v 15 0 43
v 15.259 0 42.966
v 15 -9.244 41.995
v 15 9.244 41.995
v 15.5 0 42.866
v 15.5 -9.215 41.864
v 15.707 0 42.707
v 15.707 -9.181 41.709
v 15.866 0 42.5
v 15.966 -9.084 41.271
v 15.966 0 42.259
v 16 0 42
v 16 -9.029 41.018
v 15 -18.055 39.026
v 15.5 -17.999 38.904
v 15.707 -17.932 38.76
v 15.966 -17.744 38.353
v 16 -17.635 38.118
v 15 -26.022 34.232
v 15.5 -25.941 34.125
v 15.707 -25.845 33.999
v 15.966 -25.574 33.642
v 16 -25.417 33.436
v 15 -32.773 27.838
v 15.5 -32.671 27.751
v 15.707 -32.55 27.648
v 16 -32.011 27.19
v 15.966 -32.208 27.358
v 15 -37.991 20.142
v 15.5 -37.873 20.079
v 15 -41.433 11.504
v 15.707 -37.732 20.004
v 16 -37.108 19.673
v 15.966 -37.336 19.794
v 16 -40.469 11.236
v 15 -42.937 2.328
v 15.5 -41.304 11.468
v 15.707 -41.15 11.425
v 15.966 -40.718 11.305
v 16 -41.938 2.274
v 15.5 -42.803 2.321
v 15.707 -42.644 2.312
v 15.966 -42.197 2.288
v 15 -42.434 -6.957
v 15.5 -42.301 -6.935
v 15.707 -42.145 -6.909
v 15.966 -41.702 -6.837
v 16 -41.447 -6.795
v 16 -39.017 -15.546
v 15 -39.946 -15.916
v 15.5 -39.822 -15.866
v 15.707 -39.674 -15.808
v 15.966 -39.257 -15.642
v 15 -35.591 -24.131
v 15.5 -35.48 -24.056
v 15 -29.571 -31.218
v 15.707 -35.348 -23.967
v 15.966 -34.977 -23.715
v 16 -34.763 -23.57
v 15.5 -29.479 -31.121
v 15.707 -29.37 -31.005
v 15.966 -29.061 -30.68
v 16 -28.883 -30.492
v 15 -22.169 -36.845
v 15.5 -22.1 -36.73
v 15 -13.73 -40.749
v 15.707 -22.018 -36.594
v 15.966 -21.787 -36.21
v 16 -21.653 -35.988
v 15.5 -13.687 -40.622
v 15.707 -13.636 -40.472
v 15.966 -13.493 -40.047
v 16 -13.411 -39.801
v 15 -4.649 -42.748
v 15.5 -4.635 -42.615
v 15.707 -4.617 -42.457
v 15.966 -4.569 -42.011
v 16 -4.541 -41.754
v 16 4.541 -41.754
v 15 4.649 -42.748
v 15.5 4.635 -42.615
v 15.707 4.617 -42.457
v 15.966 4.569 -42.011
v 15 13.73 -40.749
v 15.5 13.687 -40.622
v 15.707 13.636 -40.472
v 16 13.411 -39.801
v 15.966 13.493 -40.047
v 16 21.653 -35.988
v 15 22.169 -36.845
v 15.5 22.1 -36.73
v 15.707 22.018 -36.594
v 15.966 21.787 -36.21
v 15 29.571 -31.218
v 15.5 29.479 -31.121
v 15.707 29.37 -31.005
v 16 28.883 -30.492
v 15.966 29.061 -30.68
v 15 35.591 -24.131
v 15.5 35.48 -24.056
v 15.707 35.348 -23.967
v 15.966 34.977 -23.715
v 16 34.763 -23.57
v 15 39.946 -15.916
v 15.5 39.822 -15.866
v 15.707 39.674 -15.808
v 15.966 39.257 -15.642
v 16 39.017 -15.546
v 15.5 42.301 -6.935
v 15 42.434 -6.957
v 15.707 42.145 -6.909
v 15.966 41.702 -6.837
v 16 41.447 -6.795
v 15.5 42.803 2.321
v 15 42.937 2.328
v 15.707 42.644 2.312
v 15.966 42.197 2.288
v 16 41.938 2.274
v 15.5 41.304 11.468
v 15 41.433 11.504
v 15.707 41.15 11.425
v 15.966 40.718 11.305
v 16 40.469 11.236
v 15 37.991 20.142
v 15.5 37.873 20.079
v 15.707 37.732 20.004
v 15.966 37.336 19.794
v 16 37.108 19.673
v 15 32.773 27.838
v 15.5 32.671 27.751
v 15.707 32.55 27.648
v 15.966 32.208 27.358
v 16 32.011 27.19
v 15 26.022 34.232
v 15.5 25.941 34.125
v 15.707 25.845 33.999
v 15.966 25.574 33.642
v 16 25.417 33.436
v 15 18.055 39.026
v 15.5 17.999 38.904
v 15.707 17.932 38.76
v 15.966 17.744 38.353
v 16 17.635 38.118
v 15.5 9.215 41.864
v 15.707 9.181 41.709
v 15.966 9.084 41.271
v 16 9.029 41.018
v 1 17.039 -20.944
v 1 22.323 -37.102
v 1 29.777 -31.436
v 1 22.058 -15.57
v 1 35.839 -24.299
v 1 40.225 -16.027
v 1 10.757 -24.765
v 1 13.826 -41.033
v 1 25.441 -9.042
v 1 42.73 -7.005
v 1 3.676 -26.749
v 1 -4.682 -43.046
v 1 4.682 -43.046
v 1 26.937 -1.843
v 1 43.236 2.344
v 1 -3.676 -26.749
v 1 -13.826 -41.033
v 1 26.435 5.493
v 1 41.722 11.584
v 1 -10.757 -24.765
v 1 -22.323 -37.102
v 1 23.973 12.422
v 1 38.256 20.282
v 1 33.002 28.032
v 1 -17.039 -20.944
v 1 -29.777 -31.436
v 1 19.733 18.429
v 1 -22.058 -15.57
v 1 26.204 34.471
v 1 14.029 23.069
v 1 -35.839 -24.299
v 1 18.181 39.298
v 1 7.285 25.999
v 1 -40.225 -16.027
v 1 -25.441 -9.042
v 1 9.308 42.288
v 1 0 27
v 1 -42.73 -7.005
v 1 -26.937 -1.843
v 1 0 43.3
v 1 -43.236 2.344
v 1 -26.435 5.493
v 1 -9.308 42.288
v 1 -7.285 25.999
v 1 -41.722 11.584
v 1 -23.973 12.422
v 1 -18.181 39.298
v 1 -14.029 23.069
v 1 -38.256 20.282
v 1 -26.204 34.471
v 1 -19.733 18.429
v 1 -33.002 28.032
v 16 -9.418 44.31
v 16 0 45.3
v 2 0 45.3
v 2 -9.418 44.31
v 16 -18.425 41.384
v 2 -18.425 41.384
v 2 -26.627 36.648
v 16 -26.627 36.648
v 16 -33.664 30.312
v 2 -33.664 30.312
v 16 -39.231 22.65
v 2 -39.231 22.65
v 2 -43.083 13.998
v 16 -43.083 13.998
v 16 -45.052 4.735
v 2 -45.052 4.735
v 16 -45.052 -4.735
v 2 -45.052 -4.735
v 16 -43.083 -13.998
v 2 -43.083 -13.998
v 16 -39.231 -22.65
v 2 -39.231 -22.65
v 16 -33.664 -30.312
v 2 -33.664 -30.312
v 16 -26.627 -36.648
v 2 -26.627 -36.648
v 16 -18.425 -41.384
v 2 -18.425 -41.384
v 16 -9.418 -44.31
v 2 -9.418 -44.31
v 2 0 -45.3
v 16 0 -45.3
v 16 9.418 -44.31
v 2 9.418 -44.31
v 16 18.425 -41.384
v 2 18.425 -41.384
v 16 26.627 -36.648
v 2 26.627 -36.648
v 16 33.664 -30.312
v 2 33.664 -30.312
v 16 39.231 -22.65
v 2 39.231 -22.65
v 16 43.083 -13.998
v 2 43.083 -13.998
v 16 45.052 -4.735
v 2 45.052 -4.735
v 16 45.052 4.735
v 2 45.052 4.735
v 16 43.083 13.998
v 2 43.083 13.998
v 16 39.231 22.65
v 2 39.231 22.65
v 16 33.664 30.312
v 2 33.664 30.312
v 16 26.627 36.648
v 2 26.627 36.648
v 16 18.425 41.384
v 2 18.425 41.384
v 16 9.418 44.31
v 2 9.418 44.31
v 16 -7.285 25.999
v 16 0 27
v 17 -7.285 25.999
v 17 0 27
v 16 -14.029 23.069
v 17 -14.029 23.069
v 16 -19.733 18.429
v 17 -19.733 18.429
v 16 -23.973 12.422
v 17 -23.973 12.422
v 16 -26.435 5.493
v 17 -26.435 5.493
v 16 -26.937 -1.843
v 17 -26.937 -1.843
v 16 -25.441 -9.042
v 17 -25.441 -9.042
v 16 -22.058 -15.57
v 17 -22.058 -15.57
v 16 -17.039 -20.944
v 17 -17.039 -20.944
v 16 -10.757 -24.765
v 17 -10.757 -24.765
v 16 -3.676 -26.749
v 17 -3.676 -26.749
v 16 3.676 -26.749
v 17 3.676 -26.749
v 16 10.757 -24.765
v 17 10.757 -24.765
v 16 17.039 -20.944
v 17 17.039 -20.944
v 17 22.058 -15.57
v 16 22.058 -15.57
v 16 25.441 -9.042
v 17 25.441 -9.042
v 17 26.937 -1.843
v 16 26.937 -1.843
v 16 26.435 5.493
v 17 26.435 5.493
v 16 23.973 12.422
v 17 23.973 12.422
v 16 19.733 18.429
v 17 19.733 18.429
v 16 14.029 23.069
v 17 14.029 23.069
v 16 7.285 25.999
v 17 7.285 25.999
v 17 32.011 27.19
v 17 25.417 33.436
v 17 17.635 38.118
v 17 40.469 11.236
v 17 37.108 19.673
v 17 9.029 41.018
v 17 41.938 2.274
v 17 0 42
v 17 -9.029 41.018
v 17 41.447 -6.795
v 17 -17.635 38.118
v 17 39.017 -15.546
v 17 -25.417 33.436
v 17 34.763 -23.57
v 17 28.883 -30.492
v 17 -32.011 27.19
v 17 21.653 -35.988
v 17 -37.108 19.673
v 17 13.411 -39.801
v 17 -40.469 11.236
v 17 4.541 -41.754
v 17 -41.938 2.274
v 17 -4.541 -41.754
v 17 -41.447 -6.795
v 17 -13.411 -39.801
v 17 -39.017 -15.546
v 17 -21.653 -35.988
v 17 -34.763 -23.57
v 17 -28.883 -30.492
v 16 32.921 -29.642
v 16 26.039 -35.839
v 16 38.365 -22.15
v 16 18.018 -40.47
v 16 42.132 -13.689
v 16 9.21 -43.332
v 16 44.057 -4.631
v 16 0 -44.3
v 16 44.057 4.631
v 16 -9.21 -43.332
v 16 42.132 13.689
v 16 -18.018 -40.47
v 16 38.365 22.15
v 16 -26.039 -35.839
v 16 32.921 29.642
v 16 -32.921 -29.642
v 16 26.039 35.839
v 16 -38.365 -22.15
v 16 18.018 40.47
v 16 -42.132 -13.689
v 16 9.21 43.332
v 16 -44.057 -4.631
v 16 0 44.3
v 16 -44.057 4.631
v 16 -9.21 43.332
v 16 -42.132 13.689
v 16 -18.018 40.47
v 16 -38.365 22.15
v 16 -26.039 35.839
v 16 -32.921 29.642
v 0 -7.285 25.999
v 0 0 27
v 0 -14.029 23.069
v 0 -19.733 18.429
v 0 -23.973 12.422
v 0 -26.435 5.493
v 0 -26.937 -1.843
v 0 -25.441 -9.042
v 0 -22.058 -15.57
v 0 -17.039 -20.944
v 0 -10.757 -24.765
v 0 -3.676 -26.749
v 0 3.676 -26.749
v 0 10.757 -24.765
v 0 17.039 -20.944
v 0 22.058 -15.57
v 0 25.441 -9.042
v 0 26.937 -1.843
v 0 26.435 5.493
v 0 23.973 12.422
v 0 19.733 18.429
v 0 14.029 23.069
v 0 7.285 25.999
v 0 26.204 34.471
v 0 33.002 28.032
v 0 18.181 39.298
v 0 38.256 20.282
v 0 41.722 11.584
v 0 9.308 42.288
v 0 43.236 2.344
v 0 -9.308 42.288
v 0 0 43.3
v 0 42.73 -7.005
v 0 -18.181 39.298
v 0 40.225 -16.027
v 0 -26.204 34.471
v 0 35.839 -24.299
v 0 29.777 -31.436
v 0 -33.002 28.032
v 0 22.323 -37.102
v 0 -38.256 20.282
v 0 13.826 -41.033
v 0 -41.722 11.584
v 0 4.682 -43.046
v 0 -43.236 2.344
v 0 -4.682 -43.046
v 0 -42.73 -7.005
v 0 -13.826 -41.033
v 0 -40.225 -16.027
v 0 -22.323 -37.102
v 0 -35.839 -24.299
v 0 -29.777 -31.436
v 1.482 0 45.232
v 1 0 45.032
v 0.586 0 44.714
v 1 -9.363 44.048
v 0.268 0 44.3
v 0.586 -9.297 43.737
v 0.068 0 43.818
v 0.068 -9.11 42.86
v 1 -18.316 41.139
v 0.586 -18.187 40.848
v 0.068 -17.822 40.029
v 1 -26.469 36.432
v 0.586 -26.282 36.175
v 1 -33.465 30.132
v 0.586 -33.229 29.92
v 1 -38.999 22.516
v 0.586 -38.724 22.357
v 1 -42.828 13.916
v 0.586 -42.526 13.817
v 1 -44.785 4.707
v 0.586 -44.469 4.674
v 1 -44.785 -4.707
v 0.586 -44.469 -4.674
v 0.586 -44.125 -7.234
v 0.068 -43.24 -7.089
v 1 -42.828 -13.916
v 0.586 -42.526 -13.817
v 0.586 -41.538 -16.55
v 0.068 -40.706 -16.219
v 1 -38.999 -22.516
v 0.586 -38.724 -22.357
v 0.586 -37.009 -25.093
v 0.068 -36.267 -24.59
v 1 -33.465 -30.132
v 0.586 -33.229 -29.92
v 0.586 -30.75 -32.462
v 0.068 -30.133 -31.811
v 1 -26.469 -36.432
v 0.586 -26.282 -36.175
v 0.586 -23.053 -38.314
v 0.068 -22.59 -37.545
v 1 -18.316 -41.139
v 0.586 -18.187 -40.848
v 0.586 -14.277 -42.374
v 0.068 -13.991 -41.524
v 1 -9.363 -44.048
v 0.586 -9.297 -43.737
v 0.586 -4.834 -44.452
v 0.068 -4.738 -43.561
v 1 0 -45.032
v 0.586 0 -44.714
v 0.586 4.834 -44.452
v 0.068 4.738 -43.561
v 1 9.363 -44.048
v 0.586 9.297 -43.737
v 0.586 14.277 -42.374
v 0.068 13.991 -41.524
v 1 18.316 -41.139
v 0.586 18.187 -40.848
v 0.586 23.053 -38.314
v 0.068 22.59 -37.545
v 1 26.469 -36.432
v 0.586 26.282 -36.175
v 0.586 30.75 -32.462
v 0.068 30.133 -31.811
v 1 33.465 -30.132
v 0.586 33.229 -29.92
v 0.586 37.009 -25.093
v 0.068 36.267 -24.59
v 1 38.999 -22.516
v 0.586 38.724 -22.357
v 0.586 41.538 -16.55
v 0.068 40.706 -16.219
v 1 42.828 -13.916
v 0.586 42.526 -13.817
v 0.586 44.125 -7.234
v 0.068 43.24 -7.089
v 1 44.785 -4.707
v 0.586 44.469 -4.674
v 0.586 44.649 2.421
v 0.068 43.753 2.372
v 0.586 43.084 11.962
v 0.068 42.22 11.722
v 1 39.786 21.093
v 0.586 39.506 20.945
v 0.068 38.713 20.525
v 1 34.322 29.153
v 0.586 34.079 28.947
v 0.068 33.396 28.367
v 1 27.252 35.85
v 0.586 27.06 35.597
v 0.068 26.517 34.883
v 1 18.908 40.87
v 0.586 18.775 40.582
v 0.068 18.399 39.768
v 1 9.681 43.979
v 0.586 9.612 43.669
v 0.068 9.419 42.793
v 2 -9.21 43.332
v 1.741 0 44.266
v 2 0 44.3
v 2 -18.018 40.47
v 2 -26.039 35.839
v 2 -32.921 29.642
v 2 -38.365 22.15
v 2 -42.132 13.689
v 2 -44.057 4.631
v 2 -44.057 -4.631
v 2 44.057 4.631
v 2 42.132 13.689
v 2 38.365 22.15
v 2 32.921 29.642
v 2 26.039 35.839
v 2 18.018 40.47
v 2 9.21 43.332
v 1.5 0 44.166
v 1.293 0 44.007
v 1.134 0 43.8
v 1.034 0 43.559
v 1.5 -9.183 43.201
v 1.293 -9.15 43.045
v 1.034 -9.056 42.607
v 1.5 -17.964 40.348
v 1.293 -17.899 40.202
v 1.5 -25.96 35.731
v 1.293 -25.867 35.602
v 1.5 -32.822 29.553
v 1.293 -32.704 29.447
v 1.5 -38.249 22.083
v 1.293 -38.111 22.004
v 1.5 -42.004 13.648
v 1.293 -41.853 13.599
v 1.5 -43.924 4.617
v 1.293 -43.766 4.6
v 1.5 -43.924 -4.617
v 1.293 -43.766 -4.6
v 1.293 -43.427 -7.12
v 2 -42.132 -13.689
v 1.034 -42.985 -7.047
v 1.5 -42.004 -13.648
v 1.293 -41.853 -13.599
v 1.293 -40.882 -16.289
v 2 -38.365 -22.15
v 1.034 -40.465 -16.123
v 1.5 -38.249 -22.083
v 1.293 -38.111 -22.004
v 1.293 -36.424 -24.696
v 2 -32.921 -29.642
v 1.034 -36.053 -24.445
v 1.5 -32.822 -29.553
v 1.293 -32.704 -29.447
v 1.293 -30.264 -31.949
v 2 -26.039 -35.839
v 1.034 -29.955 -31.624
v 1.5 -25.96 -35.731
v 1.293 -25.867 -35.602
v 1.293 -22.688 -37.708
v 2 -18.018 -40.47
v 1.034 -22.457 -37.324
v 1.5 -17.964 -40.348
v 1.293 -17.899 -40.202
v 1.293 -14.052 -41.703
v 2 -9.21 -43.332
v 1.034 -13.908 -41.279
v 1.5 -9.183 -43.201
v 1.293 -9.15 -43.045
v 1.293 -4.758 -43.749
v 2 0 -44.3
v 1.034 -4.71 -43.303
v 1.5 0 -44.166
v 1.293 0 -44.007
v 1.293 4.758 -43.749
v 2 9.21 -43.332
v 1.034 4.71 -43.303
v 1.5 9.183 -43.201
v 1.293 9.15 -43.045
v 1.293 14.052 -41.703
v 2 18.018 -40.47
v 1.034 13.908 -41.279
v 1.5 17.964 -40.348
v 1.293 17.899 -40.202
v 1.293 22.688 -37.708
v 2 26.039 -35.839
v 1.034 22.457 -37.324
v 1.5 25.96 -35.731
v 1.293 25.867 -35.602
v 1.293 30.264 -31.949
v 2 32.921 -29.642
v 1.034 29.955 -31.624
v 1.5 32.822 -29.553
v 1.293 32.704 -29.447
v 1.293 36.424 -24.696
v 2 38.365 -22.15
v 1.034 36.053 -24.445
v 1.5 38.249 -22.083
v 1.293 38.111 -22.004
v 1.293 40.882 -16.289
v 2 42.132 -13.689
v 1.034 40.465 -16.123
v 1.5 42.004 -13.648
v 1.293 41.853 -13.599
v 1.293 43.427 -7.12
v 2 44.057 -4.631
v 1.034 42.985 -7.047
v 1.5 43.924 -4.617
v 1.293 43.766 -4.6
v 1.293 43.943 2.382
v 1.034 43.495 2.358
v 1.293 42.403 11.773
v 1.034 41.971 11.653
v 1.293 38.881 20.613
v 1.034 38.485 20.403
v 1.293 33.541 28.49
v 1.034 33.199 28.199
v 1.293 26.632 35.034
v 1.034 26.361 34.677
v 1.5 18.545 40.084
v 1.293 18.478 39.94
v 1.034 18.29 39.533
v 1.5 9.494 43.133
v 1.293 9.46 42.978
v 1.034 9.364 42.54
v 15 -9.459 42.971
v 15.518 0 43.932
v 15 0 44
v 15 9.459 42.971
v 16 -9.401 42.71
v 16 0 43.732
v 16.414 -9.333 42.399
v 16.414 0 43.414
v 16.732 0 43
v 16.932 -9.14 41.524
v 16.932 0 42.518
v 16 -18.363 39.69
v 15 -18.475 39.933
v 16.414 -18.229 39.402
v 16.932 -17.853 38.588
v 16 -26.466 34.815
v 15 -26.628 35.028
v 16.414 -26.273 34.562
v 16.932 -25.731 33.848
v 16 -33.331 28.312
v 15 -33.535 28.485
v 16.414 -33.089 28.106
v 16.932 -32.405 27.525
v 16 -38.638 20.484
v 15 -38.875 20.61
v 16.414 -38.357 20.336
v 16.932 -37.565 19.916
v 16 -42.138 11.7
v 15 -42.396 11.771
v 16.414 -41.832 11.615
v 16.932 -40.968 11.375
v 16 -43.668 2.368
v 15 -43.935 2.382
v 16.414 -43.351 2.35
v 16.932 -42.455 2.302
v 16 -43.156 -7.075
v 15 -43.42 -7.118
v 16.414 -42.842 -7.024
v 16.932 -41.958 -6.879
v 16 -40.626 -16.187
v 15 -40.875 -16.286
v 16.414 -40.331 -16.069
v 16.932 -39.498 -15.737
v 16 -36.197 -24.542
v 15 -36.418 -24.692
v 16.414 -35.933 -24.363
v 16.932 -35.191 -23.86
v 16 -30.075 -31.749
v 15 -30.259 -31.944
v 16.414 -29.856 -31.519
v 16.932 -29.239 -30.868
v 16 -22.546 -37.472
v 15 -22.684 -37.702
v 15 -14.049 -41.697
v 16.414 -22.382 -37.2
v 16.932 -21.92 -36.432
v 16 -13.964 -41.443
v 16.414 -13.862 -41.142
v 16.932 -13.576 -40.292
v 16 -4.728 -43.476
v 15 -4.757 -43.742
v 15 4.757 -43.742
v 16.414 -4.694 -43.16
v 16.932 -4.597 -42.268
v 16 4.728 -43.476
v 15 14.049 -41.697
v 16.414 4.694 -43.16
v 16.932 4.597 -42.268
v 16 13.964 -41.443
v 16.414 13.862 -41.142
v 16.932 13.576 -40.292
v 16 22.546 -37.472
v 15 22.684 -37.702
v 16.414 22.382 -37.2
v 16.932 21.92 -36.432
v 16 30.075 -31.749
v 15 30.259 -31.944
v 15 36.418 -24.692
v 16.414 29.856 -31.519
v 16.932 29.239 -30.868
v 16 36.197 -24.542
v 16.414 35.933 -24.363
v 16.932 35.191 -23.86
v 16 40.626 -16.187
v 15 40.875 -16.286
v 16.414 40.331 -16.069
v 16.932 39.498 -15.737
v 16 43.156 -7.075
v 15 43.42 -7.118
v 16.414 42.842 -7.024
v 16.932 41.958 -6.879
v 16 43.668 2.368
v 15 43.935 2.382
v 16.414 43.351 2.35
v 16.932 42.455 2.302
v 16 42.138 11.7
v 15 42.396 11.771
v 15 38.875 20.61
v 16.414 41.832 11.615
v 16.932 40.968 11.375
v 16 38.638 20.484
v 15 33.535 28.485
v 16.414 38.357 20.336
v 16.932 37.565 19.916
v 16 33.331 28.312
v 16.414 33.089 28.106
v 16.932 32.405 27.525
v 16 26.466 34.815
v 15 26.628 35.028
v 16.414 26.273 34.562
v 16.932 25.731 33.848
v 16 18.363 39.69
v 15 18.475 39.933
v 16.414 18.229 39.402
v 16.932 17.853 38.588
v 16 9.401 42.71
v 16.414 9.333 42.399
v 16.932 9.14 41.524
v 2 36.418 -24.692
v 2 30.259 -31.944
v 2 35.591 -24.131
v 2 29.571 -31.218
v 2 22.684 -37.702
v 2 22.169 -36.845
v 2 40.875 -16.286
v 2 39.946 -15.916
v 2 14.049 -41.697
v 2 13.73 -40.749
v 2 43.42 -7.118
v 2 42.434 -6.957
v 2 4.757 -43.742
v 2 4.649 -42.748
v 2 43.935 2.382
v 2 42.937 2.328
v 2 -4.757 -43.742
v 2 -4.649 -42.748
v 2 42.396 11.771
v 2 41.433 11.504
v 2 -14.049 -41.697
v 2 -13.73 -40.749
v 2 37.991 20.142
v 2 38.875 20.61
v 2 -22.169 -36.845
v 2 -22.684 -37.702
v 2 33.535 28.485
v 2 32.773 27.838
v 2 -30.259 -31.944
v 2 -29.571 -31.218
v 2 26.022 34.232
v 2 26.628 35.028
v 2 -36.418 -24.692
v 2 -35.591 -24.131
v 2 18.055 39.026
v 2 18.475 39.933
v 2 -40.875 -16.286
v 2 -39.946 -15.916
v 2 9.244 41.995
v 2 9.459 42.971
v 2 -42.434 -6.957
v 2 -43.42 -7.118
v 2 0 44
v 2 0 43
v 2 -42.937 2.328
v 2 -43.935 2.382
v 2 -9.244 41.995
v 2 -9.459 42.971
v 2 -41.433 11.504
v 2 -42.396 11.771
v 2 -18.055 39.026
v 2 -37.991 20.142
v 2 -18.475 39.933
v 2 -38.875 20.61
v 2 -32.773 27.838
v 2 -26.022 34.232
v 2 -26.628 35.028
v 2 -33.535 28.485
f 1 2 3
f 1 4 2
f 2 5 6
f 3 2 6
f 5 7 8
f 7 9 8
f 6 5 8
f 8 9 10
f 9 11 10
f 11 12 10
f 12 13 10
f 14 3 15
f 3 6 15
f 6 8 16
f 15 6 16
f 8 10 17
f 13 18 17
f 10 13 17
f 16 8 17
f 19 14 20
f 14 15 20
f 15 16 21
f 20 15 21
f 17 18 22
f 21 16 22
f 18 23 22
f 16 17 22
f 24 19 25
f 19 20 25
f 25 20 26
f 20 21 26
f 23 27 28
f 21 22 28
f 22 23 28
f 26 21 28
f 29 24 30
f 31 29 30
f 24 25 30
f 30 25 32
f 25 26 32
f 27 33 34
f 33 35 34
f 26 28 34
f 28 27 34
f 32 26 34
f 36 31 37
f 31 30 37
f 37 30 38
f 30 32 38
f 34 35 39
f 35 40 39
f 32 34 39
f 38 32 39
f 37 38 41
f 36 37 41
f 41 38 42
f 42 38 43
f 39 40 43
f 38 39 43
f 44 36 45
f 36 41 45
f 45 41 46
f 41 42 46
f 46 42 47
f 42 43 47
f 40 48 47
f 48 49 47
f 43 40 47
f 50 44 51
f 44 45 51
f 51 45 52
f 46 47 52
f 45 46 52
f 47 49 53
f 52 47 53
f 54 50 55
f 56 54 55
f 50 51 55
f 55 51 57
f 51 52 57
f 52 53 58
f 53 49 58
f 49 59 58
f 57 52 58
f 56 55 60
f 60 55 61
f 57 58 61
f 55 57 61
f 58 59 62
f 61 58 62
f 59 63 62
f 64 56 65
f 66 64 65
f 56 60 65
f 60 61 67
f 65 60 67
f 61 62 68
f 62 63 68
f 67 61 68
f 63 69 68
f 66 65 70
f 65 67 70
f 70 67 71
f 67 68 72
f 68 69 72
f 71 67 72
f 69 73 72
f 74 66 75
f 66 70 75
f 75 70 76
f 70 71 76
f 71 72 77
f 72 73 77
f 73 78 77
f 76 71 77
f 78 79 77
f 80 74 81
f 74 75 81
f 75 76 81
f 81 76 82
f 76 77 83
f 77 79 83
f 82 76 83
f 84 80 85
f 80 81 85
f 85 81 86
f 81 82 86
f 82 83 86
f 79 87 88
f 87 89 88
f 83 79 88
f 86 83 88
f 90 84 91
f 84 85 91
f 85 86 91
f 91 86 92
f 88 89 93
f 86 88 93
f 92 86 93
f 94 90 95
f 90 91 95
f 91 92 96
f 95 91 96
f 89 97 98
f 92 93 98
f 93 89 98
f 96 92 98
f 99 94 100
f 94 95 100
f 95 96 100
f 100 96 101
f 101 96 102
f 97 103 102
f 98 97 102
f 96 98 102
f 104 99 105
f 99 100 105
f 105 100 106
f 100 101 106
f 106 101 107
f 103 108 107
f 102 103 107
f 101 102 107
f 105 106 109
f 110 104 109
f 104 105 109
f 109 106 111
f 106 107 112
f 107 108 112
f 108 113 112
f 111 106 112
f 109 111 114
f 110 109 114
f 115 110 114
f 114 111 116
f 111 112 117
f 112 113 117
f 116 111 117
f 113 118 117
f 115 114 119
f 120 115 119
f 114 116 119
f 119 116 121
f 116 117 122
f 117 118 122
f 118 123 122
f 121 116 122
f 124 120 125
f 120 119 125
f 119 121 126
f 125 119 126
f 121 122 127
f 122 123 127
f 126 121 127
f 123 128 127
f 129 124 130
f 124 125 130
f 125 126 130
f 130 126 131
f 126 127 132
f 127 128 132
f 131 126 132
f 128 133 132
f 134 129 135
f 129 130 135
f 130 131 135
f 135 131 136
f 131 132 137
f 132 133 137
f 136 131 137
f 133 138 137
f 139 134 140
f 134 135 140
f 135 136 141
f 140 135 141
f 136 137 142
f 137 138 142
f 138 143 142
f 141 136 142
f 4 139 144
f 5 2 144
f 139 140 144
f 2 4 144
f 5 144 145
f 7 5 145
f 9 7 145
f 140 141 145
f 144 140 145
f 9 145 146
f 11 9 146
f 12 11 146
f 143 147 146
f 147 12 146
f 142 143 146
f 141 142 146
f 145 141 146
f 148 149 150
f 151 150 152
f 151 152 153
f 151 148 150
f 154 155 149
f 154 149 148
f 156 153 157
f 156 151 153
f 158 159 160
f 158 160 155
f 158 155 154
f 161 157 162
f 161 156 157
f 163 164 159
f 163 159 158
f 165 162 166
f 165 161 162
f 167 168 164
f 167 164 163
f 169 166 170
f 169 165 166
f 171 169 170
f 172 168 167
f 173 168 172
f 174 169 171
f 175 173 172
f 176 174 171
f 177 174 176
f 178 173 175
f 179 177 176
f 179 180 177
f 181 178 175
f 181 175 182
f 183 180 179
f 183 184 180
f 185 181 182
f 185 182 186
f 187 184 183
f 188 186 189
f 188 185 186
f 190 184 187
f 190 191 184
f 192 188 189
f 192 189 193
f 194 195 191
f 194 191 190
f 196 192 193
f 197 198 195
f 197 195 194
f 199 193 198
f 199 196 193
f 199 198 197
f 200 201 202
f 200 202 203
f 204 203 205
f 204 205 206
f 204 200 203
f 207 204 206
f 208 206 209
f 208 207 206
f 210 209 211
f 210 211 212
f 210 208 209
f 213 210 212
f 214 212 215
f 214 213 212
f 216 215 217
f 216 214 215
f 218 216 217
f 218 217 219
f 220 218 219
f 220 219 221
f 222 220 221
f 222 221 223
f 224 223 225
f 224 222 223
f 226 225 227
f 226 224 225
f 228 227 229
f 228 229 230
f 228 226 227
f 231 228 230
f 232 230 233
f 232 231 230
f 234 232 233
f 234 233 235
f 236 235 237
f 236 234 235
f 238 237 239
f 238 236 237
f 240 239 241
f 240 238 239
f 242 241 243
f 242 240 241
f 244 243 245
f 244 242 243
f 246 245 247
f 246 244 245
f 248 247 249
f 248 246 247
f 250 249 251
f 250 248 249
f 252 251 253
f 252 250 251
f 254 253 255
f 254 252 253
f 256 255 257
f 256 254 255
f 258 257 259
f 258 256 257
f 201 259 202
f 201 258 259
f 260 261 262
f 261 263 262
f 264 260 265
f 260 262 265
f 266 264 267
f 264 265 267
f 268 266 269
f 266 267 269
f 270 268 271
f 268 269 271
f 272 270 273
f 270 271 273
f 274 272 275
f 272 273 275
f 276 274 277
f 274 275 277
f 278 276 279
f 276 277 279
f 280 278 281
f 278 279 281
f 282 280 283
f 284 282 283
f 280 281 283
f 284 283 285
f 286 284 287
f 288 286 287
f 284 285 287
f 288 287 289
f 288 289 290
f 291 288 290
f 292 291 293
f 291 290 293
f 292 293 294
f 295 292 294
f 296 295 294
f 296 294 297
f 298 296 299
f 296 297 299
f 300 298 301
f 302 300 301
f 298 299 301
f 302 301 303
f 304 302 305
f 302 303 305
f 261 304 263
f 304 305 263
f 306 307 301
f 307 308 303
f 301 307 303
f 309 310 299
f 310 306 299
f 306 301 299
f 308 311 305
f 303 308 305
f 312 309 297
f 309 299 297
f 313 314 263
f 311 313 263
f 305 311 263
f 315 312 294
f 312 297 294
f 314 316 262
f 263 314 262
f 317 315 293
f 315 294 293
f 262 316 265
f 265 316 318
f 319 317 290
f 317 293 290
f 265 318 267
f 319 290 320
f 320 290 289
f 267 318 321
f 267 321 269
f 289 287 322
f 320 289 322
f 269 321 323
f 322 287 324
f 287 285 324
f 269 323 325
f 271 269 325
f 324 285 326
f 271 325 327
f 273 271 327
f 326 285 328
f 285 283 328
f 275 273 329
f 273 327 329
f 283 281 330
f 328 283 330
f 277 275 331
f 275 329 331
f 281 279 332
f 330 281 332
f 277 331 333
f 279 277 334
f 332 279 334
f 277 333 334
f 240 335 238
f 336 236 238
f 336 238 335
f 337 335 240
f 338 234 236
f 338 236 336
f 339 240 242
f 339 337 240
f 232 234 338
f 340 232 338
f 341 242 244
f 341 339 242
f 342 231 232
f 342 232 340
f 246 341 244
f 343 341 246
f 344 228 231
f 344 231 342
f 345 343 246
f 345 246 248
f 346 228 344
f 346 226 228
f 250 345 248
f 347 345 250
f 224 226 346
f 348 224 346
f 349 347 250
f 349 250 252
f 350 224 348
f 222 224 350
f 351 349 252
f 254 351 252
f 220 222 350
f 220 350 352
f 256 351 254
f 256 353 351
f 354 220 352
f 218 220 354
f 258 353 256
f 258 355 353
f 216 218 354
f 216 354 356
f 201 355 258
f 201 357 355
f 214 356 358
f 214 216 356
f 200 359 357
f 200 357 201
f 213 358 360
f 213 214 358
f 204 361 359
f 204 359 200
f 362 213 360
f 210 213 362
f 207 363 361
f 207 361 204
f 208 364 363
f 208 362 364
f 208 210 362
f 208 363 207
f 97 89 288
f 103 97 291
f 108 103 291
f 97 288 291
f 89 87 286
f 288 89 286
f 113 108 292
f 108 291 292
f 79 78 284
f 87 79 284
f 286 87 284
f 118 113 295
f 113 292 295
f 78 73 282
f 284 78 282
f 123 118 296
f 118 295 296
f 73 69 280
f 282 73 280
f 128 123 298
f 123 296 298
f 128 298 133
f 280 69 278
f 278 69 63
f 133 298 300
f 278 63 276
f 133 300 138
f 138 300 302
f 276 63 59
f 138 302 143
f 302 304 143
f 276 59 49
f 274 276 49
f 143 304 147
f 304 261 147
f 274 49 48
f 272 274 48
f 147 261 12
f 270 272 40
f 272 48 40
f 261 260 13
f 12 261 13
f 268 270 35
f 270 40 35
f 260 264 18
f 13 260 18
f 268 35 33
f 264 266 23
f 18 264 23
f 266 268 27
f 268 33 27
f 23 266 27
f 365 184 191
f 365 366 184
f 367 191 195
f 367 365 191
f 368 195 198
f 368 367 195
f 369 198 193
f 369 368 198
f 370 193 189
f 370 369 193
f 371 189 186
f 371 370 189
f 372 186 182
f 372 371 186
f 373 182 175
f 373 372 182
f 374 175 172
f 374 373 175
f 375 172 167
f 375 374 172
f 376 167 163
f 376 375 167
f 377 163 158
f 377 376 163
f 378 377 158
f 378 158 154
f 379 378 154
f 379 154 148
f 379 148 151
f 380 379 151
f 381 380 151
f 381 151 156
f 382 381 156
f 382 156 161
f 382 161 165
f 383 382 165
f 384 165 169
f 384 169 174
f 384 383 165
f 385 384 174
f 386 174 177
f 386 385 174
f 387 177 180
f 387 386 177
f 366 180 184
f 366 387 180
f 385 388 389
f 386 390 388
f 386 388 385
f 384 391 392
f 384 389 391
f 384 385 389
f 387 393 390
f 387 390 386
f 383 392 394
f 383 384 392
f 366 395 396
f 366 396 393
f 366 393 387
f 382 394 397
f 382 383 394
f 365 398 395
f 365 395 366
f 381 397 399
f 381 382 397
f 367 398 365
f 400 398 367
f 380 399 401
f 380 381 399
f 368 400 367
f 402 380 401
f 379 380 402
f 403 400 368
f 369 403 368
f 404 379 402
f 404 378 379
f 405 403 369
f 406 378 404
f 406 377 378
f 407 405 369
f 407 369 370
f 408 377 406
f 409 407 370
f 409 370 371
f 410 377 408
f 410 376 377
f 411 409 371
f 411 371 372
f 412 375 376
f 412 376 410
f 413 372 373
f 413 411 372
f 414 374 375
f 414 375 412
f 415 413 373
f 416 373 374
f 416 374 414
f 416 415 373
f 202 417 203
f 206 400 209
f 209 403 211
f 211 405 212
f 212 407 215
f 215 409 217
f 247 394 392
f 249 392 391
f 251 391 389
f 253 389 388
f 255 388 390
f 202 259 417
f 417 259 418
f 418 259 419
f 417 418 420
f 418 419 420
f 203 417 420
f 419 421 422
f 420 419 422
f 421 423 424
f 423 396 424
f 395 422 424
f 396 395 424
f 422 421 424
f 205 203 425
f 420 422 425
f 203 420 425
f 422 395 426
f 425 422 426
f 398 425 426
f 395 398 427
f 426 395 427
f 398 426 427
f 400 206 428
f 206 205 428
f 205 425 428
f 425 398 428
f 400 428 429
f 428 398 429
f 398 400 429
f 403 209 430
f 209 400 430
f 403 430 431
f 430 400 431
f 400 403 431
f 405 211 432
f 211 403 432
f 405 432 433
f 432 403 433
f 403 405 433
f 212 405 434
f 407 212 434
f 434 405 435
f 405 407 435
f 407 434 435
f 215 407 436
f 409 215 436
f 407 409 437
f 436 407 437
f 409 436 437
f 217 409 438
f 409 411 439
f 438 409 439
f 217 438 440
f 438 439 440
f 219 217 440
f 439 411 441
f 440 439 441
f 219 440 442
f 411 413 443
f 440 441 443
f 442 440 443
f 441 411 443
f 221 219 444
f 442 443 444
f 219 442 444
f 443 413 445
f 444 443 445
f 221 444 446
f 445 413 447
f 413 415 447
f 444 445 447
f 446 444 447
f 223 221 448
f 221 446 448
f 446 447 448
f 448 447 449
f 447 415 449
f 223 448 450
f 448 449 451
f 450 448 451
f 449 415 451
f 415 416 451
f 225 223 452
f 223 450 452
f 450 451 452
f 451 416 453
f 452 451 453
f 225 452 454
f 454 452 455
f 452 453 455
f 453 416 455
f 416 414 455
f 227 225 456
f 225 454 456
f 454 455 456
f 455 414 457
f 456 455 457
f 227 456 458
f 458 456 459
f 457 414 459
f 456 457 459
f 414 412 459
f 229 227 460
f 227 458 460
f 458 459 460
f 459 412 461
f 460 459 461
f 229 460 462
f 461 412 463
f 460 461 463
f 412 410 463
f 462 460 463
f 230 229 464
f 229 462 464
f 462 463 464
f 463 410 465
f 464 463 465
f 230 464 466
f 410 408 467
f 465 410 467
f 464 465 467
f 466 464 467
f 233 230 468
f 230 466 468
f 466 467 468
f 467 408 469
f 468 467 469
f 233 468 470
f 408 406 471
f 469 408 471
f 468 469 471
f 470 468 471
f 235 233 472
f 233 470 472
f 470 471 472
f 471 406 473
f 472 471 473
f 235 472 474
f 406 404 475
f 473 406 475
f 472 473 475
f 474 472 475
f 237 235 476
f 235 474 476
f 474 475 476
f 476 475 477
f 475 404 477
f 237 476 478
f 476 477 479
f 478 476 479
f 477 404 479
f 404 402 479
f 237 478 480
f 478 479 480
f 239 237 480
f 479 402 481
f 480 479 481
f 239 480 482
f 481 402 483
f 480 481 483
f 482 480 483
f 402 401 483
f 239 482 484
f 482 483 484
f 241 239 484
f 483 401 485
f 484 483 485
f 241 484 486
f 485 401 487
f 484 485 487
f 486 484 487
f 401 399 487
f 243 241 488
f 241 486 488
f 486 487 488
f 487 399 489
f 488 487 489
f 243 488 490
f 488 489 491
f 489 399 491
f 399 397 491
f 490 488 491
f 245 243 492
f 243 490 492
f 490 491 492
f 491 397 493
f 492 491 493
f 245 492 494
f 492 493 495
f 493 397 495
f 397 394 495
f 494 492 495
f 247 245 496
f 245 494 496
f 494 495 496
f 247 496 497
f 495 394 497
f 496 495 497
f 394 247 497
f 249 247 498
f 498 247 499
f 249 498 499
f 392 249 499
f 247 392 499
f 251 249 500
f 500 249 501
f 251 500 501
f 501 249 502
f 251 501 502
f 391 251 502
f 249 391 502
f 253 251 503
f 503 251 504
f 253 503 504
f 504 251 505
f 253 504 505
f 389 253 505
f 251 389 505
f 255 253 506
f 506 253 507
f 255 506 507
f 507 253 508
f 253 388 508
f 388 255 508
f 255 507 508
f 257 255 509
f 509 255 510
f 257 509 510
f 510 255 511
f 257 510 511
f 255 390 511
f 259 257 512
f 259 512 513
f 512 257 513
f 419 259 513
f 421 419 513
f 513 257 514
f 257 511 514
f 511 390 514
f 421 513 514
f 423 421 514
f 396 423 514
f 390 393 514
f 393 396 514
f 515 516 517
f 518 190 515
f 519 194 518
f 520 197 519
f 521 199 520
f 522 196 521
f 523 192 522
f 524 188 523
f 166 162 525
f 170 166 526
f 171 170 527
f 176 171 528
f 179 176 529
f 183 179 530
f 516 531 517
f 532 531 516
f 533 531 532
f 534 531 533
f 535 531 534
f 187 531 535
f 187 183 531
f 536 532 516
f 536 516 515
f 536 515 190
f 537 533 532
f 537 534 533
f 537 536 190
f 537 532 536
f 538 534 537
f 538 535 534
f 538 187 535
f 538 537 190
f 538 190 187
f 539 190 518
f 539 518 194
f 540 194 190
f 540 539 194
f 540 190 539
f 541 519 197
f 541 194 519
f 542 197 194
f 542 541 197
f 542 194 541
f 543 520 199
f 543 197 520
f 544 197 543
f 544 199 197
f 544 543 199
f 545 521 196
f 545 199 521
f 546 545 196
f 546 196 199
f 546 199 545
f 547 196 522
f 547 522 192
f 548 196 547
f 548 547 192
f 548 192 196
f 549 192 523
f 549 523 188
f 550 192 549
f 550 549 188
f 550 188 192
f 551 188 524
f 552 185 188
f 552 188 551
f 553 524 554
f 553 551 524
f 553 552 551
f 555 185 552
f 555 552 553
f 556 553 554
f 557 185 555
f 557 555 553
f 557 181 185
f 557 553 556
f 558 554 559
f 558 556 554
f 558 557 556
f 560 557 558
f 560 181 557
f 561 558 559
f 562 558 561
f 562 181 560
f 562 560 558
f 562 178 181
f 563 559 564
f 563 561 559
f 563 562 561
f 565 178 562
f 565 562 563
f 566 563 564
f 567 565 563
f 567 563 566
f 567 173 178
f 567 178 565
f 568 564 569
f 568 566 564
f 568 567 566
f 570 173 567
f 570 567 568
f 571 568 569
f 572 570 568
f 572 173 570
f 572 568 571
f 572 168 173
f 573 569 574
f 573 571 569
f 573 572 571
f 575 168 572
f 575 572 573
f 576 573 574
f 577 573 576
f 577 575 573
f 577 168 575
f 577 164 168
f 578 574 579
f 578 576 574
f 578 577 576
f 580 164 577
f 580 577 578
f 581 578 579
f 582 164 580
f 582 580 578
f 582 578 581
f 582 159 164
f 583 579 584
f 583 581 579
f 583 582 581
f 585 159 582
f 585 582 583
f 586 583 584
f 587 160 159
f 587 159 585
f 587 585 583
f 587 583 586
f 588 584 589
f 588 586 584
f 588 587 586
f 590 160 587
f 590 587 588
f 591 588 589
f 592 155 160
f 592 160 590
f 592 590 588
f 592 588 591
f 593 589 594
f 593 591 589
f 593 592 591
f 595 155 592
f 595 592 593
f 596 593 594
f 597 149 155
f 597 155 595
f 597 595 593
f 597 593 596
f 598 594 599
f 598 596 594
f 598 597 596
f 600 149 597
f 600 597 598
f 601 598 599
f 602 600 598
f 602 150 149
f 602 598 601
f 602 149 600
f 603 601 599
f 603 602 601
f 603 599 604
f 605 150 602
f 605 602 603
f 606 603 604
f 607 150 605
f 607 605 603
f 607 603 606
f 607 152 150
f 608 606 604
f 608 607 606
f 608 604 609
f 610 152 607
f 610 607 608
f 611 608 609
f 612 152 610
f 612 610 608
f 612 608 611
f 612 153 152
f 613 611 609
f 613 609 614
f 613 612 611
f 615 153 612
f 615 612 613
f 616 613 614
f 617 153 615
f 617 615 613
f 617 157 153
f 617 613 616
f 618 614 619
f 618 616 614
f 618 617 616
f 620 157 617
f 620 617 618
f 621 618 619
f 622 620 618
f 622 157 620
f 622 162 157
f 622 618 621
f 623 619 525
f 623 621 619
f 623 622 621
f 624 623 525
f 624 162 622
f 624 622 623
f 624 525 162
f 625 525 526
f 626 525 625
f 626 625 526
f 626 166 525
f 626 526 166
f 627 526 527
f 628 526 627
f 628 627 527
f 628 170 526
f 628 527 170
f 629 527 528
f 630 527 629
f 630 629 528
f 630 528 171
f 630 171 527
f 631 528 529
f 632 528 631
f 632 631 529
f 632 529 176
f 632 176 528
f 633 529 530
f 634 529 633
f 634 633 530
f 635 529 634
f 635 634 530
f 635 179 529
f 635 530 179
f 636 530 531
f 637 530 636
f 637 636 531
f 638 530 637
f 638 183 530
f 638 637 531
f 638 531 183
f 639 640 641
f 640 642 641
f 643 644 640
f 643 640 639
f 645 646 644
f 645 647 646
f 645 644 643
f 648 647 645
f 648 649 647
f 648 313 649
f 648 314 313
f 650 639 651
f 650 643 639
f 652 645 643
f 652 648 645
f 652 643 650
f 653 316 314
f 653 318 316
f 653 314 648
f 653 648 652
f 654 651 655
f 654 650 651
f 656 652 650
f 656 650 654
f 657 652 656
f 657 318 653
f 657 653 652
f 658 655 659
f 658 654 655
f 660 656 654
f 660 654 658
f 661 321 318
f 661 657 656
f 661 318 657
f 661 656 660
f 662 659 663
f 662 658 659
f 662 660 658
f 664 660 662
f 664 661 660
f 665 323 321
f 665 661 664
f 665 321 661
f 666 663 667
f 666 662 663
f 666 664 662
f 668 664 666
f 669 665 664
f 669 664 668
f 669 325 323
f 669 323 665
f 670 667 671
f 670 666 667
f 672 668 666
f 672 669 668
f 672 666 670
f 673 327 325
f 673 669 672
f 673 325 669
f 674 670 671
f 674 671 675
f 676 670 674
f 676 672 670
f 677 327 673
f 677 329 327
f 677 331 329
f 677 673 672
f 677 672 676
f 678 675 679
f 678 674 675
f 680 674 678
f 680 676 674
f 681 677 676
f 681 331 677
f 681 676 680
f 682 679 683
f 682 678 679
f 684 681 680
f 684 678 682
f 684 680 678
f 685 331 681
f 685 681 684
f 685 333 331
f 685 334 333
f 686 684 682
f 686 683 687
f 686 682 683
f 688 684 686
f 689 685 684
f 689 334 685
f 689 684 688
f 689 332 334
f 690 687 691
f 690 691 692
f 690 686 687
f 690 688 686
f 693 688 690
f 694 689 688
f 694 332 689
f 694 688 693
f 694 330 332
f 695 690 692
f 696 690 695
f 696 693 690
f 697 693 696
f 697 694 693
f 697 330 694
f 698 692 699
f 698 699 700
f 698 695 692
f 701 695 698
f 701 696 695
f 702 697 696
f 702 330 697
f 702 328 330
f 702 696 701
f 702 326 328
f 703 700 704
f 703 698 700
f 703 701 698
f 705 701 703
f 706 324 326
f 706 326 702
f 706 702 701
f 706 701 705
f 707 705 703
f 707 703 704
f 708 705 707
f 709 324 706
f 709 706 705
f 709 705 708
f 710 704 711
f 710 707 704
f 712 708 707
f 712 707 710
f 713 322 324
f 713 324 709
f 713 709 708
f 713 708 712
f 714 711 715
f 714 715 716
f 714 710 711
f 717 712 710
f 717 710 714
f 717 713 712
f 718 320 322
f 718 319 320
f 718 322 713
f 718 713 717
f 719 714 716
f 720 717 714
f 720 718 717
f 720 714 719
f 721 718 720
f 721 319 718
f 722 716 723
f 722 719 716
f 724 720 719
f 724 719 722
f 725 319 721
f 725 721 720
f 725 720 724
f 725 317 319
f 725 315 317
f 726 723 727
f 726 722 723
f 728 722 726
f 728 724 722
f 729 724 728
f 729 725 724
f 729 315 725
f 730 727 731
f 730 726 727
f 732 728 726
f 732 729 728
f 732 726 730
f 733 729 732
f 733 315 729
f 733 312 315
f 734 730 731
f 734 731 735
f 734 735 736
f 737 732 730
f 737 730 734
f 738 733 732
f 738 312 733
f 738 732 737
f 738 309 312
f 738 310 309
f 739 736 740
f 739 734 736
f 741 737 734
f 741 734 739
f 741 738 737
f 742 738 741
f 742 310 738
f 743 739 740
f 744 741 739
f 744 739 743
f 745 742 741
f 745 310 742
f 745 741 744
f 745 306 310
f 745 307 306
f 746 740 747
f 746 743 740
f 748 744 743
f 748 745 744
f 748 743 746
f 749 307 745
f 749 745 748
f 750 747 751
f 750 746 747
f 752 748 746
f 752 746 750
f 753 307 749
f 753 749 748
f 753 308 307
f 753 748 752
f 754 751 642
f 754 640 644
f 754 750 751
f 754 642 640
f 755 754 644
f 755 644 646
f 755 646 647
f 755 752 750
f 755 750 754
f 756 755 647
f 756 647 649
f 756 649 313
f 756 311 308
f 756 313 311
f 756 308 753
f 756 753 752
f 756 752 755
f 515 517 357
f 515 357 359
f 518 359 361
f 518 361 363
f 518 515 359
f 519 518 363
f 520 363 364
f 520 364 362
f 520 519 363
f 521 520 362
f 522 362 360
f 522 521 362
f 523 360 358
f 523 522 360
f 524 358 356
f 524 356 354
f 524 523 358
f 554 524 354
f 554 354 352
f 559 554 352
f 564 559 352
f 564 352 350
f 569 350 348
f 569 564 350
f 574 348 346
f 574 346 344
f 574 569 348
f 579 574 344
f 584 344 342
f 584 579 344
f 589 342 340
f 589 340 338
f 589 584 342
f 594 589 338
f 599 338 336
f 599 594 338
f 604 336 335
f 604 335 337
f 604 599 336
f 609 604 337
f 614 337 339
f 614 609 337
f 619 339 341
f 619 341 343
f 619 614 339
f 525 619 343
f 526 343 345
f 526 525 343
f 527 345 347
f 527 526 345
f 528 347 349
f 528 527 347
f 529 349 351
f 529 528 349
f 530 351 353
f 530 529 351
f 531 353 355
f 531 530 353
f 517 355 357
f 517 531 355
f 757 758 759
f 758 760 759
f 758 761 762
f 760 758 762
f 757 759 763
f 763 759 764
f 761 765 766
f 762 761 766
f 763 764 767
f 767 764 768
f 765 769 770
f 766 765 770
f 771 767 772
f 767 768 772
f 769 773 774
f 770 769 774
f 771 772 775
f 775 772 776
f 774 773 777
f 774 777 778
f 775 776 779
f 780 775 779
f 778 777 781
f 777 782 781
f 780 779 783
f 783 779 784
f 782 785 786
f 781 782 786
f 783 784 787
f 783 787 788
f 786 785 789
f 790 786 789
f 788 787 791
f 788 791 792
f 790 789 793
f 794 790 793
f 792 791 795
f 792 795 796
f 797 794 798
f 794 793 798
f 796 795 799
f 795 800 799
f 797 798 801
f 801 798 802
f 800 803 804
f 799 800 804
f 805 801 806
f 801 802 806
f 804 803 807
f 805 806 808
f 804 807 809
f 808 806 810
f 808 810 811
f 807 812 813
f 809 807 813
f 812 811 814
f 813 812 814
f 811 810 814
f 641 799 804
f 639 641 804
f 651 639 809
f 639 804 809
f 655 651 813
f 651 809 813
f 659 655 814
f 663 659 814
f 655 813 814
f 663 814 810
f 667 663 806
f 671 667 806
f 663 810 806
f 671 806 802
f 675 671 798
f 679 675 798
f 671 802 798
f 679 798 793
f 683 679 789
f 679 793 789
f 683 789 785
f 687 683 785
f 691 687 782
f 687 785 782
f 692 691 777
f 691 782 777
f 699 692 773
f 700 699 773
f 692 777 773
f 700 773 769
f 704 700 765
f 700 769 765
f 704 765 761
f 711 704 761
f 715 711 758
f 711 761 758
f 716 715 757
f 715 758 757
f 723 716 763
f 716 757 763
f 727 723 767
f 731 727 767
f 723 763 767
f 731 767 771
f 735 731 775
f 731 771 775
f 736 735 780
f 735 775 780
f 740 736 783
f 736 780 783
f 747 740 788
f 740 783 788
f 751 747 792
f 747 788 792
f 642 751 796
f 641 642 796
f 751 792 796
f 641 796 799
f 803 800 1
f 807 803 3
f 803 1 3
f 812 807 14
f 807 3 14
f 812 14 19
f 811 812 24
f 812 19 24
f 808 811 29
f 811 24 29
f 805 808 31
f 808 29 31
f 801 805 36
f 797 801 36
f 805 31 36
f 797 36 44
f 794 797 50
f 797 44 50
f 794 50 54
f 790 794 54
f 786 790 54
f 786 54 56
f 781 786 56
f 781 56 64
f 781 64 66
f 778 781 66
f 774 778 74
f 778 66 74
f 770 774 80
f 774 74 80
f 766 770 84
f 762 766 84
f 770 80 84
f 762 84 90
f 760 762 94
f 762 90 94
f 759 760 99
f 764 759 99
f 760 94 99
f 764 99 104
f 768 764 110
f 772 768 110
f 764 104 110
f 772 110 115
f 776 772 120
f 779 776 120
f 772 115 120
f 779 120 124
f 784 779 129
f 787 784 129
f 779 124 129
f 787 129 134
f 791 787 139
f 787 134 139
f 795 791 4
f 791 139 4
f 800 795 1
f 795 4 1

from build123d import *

# Parameters (mm, degrees)
FILLET1_R = 1
FILLET2_R = 1
FILLET3_R = 2
FILLET4_R = 2


with BuildPart() as part:
    # Sketch1 → Revolve1 (revolve)
    with BuildSketch(Plane.XY, mode=Mode.PRIVATE) as revolve1_sk:
        Polygon((0, 27), (0, 45.3), (16, 45.3), (16, 44.3), (1, 44.3), (1, 27), align=None)
        Polygon((17, 27), (17, 44), (2, 44), (2, 43), (16, 43), (16, 27), align=None)
    revolve(revolve1_sk.sketch.rotate(Axis((-12.255218601, 0, 0), (1, 0, 0)), 90), axis=Axis((-12.255218601, 0, 0), (1, 0, 0)))

    # Fillet1
    fillet1_edges = [part.edges().sort_by_distance(p)[0] for p in [
        (16, 0, -43),
    ]]
    fillet(fillet1_edges, radius=FILLET1_R)

    # Fillet2
    fillet2_edges = [part.edges().sort_by_distance(p)[0] for p in [
        (1, 0, -44.3),
    ]]
    fillet(fillet2_edges, radius=FILLET2_R)

    # Fillet3
    fillet3_edges = [part.edges().sort_by_distance(p)[0] for p in [
        (0, 0, -45.3),
    ]]
    fillet(fillet3_edges, radius=FILLET3_R)

    # Fillet4
    fillet4_edges = [part.edges().sort_by_distance(p)[0] for p in [
        (17, 0, -44),
    ]]
    fillet(fillet4_edges, radius=FILLET4_R)


solid = part.part
